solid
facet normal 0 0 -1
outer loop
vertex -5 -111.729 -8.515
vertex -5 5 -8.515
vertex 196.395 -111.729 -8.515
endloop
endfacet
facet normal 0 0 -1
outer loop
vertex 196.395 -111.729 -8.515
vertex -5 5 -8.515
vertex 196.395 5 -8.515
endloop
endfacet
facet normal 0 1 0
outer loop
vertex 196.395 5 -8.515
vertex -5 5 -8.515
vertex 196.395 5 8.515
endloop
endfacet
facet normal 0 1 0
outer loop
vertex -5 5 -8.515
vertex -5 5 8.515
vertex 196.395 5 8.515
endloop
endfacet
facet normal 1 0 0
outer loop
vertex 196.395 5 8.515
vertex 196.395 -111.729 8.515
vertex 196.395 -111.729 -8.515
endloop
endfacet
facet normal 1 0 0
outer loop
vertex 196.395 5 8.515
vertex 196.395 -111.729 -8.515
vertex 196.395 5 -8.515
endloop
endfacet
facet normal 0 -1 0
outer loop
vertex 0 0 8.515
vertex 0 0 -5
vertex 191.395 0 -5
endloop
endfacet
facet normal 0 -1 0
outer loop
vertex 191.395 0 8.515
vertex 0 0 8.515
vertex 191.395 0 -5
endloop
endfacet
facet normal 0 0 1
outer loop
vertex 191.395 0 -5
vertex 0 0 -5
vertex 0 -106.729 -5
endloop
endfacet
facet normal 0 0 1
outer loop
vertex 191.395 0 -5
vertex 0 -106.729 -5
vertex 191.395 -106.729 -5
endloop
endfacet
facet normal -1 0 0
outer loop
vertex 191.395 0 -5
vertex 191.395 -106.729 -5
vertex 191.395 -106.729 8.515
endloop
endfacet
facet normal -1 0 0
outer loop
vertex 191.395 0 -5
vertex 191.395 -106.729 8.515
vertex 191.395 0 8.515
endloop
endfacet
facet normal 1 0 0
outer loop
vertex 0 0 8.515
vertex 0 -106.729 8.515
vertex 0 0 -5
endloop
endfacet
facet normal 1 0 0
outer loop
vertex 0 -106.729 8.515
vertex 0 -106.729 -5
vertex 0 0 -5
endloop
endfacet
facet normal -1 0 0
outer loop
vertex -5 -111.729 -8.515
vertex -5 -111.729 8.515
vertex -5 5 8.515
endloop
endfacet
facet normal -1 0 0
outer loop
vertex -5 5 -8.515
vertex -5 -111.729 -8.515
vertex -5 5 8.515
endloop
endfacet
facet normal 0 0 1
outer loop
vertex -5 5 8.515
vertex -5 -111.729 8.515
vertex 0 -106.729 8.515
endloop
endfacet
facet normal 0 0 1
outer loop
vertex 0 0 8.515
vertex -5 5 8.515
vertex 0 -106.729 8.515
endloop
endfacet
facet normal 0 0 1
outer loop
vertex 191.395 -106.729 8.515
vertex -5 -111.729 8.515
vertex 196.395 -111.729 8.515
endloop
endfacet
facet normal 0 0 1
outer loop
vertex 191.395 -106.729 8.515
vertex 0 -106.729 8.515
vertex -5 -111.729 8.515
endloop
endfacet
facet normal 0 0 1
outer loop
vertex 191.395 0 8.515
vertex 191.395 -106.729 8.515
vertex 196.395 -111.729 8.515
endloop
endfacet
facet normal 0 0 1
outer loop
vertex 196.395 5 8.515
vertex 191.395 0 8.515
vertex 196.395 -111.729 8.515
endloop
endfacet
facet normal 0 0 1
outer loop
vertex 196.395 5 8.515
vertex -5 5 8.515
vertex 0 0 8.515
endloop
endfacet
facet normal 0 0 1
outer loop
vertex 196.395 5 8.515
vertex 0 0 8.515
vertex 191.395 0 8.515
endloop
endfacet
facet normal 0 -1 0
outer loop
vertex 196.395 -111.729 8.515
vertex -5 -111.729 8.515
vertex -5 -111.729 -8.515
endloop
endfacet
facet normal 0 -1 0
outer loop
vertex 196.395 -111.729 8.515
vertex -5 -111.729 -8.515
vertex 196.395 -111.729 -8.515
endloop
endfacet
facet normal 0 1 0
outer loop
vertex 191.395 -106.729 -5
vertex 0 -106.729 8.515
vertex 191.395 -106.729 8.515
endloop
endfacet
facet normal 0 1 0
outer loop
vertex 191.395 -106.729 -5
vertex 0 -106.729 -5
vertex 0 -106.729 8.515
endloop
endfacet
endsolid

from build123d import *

# Parameters (mm, degrees)
F0_W          = 201.395
F0_H          = 116.729
F1_DEPTH      = 8.515
F2_W          = 191.395
F2_H          = 106.729
F3_DEPTH      = 8.515
F3_DEPTH_BACK = 5


with BuildPart() as f1:
    # F0 (on Top) → F1 (new body, symmetric)
    with BuildSketch(Plane.XY):
        with Locations((95.6975, -53.3645)):
            Rectangle(F0_W, F0_H)
    extrude(amount=F1_DEPTH, both=True)

    # F2 (on Top) → F3 (cut, two sides)
    with BuildSketch(Plane.XY) as f3_sk:
        with Locations((95.6975, -53.3645)):
            Rectangle(F2_W, F2_H)
    extrude(amount=F3_DEPTH, mode=Mode.SUBTRACT)
    extrude(f3_sk.sketch, amount=-F3_DEPTH_BACK, mode=Mode.SUBTRACT)


solid = f1.part
